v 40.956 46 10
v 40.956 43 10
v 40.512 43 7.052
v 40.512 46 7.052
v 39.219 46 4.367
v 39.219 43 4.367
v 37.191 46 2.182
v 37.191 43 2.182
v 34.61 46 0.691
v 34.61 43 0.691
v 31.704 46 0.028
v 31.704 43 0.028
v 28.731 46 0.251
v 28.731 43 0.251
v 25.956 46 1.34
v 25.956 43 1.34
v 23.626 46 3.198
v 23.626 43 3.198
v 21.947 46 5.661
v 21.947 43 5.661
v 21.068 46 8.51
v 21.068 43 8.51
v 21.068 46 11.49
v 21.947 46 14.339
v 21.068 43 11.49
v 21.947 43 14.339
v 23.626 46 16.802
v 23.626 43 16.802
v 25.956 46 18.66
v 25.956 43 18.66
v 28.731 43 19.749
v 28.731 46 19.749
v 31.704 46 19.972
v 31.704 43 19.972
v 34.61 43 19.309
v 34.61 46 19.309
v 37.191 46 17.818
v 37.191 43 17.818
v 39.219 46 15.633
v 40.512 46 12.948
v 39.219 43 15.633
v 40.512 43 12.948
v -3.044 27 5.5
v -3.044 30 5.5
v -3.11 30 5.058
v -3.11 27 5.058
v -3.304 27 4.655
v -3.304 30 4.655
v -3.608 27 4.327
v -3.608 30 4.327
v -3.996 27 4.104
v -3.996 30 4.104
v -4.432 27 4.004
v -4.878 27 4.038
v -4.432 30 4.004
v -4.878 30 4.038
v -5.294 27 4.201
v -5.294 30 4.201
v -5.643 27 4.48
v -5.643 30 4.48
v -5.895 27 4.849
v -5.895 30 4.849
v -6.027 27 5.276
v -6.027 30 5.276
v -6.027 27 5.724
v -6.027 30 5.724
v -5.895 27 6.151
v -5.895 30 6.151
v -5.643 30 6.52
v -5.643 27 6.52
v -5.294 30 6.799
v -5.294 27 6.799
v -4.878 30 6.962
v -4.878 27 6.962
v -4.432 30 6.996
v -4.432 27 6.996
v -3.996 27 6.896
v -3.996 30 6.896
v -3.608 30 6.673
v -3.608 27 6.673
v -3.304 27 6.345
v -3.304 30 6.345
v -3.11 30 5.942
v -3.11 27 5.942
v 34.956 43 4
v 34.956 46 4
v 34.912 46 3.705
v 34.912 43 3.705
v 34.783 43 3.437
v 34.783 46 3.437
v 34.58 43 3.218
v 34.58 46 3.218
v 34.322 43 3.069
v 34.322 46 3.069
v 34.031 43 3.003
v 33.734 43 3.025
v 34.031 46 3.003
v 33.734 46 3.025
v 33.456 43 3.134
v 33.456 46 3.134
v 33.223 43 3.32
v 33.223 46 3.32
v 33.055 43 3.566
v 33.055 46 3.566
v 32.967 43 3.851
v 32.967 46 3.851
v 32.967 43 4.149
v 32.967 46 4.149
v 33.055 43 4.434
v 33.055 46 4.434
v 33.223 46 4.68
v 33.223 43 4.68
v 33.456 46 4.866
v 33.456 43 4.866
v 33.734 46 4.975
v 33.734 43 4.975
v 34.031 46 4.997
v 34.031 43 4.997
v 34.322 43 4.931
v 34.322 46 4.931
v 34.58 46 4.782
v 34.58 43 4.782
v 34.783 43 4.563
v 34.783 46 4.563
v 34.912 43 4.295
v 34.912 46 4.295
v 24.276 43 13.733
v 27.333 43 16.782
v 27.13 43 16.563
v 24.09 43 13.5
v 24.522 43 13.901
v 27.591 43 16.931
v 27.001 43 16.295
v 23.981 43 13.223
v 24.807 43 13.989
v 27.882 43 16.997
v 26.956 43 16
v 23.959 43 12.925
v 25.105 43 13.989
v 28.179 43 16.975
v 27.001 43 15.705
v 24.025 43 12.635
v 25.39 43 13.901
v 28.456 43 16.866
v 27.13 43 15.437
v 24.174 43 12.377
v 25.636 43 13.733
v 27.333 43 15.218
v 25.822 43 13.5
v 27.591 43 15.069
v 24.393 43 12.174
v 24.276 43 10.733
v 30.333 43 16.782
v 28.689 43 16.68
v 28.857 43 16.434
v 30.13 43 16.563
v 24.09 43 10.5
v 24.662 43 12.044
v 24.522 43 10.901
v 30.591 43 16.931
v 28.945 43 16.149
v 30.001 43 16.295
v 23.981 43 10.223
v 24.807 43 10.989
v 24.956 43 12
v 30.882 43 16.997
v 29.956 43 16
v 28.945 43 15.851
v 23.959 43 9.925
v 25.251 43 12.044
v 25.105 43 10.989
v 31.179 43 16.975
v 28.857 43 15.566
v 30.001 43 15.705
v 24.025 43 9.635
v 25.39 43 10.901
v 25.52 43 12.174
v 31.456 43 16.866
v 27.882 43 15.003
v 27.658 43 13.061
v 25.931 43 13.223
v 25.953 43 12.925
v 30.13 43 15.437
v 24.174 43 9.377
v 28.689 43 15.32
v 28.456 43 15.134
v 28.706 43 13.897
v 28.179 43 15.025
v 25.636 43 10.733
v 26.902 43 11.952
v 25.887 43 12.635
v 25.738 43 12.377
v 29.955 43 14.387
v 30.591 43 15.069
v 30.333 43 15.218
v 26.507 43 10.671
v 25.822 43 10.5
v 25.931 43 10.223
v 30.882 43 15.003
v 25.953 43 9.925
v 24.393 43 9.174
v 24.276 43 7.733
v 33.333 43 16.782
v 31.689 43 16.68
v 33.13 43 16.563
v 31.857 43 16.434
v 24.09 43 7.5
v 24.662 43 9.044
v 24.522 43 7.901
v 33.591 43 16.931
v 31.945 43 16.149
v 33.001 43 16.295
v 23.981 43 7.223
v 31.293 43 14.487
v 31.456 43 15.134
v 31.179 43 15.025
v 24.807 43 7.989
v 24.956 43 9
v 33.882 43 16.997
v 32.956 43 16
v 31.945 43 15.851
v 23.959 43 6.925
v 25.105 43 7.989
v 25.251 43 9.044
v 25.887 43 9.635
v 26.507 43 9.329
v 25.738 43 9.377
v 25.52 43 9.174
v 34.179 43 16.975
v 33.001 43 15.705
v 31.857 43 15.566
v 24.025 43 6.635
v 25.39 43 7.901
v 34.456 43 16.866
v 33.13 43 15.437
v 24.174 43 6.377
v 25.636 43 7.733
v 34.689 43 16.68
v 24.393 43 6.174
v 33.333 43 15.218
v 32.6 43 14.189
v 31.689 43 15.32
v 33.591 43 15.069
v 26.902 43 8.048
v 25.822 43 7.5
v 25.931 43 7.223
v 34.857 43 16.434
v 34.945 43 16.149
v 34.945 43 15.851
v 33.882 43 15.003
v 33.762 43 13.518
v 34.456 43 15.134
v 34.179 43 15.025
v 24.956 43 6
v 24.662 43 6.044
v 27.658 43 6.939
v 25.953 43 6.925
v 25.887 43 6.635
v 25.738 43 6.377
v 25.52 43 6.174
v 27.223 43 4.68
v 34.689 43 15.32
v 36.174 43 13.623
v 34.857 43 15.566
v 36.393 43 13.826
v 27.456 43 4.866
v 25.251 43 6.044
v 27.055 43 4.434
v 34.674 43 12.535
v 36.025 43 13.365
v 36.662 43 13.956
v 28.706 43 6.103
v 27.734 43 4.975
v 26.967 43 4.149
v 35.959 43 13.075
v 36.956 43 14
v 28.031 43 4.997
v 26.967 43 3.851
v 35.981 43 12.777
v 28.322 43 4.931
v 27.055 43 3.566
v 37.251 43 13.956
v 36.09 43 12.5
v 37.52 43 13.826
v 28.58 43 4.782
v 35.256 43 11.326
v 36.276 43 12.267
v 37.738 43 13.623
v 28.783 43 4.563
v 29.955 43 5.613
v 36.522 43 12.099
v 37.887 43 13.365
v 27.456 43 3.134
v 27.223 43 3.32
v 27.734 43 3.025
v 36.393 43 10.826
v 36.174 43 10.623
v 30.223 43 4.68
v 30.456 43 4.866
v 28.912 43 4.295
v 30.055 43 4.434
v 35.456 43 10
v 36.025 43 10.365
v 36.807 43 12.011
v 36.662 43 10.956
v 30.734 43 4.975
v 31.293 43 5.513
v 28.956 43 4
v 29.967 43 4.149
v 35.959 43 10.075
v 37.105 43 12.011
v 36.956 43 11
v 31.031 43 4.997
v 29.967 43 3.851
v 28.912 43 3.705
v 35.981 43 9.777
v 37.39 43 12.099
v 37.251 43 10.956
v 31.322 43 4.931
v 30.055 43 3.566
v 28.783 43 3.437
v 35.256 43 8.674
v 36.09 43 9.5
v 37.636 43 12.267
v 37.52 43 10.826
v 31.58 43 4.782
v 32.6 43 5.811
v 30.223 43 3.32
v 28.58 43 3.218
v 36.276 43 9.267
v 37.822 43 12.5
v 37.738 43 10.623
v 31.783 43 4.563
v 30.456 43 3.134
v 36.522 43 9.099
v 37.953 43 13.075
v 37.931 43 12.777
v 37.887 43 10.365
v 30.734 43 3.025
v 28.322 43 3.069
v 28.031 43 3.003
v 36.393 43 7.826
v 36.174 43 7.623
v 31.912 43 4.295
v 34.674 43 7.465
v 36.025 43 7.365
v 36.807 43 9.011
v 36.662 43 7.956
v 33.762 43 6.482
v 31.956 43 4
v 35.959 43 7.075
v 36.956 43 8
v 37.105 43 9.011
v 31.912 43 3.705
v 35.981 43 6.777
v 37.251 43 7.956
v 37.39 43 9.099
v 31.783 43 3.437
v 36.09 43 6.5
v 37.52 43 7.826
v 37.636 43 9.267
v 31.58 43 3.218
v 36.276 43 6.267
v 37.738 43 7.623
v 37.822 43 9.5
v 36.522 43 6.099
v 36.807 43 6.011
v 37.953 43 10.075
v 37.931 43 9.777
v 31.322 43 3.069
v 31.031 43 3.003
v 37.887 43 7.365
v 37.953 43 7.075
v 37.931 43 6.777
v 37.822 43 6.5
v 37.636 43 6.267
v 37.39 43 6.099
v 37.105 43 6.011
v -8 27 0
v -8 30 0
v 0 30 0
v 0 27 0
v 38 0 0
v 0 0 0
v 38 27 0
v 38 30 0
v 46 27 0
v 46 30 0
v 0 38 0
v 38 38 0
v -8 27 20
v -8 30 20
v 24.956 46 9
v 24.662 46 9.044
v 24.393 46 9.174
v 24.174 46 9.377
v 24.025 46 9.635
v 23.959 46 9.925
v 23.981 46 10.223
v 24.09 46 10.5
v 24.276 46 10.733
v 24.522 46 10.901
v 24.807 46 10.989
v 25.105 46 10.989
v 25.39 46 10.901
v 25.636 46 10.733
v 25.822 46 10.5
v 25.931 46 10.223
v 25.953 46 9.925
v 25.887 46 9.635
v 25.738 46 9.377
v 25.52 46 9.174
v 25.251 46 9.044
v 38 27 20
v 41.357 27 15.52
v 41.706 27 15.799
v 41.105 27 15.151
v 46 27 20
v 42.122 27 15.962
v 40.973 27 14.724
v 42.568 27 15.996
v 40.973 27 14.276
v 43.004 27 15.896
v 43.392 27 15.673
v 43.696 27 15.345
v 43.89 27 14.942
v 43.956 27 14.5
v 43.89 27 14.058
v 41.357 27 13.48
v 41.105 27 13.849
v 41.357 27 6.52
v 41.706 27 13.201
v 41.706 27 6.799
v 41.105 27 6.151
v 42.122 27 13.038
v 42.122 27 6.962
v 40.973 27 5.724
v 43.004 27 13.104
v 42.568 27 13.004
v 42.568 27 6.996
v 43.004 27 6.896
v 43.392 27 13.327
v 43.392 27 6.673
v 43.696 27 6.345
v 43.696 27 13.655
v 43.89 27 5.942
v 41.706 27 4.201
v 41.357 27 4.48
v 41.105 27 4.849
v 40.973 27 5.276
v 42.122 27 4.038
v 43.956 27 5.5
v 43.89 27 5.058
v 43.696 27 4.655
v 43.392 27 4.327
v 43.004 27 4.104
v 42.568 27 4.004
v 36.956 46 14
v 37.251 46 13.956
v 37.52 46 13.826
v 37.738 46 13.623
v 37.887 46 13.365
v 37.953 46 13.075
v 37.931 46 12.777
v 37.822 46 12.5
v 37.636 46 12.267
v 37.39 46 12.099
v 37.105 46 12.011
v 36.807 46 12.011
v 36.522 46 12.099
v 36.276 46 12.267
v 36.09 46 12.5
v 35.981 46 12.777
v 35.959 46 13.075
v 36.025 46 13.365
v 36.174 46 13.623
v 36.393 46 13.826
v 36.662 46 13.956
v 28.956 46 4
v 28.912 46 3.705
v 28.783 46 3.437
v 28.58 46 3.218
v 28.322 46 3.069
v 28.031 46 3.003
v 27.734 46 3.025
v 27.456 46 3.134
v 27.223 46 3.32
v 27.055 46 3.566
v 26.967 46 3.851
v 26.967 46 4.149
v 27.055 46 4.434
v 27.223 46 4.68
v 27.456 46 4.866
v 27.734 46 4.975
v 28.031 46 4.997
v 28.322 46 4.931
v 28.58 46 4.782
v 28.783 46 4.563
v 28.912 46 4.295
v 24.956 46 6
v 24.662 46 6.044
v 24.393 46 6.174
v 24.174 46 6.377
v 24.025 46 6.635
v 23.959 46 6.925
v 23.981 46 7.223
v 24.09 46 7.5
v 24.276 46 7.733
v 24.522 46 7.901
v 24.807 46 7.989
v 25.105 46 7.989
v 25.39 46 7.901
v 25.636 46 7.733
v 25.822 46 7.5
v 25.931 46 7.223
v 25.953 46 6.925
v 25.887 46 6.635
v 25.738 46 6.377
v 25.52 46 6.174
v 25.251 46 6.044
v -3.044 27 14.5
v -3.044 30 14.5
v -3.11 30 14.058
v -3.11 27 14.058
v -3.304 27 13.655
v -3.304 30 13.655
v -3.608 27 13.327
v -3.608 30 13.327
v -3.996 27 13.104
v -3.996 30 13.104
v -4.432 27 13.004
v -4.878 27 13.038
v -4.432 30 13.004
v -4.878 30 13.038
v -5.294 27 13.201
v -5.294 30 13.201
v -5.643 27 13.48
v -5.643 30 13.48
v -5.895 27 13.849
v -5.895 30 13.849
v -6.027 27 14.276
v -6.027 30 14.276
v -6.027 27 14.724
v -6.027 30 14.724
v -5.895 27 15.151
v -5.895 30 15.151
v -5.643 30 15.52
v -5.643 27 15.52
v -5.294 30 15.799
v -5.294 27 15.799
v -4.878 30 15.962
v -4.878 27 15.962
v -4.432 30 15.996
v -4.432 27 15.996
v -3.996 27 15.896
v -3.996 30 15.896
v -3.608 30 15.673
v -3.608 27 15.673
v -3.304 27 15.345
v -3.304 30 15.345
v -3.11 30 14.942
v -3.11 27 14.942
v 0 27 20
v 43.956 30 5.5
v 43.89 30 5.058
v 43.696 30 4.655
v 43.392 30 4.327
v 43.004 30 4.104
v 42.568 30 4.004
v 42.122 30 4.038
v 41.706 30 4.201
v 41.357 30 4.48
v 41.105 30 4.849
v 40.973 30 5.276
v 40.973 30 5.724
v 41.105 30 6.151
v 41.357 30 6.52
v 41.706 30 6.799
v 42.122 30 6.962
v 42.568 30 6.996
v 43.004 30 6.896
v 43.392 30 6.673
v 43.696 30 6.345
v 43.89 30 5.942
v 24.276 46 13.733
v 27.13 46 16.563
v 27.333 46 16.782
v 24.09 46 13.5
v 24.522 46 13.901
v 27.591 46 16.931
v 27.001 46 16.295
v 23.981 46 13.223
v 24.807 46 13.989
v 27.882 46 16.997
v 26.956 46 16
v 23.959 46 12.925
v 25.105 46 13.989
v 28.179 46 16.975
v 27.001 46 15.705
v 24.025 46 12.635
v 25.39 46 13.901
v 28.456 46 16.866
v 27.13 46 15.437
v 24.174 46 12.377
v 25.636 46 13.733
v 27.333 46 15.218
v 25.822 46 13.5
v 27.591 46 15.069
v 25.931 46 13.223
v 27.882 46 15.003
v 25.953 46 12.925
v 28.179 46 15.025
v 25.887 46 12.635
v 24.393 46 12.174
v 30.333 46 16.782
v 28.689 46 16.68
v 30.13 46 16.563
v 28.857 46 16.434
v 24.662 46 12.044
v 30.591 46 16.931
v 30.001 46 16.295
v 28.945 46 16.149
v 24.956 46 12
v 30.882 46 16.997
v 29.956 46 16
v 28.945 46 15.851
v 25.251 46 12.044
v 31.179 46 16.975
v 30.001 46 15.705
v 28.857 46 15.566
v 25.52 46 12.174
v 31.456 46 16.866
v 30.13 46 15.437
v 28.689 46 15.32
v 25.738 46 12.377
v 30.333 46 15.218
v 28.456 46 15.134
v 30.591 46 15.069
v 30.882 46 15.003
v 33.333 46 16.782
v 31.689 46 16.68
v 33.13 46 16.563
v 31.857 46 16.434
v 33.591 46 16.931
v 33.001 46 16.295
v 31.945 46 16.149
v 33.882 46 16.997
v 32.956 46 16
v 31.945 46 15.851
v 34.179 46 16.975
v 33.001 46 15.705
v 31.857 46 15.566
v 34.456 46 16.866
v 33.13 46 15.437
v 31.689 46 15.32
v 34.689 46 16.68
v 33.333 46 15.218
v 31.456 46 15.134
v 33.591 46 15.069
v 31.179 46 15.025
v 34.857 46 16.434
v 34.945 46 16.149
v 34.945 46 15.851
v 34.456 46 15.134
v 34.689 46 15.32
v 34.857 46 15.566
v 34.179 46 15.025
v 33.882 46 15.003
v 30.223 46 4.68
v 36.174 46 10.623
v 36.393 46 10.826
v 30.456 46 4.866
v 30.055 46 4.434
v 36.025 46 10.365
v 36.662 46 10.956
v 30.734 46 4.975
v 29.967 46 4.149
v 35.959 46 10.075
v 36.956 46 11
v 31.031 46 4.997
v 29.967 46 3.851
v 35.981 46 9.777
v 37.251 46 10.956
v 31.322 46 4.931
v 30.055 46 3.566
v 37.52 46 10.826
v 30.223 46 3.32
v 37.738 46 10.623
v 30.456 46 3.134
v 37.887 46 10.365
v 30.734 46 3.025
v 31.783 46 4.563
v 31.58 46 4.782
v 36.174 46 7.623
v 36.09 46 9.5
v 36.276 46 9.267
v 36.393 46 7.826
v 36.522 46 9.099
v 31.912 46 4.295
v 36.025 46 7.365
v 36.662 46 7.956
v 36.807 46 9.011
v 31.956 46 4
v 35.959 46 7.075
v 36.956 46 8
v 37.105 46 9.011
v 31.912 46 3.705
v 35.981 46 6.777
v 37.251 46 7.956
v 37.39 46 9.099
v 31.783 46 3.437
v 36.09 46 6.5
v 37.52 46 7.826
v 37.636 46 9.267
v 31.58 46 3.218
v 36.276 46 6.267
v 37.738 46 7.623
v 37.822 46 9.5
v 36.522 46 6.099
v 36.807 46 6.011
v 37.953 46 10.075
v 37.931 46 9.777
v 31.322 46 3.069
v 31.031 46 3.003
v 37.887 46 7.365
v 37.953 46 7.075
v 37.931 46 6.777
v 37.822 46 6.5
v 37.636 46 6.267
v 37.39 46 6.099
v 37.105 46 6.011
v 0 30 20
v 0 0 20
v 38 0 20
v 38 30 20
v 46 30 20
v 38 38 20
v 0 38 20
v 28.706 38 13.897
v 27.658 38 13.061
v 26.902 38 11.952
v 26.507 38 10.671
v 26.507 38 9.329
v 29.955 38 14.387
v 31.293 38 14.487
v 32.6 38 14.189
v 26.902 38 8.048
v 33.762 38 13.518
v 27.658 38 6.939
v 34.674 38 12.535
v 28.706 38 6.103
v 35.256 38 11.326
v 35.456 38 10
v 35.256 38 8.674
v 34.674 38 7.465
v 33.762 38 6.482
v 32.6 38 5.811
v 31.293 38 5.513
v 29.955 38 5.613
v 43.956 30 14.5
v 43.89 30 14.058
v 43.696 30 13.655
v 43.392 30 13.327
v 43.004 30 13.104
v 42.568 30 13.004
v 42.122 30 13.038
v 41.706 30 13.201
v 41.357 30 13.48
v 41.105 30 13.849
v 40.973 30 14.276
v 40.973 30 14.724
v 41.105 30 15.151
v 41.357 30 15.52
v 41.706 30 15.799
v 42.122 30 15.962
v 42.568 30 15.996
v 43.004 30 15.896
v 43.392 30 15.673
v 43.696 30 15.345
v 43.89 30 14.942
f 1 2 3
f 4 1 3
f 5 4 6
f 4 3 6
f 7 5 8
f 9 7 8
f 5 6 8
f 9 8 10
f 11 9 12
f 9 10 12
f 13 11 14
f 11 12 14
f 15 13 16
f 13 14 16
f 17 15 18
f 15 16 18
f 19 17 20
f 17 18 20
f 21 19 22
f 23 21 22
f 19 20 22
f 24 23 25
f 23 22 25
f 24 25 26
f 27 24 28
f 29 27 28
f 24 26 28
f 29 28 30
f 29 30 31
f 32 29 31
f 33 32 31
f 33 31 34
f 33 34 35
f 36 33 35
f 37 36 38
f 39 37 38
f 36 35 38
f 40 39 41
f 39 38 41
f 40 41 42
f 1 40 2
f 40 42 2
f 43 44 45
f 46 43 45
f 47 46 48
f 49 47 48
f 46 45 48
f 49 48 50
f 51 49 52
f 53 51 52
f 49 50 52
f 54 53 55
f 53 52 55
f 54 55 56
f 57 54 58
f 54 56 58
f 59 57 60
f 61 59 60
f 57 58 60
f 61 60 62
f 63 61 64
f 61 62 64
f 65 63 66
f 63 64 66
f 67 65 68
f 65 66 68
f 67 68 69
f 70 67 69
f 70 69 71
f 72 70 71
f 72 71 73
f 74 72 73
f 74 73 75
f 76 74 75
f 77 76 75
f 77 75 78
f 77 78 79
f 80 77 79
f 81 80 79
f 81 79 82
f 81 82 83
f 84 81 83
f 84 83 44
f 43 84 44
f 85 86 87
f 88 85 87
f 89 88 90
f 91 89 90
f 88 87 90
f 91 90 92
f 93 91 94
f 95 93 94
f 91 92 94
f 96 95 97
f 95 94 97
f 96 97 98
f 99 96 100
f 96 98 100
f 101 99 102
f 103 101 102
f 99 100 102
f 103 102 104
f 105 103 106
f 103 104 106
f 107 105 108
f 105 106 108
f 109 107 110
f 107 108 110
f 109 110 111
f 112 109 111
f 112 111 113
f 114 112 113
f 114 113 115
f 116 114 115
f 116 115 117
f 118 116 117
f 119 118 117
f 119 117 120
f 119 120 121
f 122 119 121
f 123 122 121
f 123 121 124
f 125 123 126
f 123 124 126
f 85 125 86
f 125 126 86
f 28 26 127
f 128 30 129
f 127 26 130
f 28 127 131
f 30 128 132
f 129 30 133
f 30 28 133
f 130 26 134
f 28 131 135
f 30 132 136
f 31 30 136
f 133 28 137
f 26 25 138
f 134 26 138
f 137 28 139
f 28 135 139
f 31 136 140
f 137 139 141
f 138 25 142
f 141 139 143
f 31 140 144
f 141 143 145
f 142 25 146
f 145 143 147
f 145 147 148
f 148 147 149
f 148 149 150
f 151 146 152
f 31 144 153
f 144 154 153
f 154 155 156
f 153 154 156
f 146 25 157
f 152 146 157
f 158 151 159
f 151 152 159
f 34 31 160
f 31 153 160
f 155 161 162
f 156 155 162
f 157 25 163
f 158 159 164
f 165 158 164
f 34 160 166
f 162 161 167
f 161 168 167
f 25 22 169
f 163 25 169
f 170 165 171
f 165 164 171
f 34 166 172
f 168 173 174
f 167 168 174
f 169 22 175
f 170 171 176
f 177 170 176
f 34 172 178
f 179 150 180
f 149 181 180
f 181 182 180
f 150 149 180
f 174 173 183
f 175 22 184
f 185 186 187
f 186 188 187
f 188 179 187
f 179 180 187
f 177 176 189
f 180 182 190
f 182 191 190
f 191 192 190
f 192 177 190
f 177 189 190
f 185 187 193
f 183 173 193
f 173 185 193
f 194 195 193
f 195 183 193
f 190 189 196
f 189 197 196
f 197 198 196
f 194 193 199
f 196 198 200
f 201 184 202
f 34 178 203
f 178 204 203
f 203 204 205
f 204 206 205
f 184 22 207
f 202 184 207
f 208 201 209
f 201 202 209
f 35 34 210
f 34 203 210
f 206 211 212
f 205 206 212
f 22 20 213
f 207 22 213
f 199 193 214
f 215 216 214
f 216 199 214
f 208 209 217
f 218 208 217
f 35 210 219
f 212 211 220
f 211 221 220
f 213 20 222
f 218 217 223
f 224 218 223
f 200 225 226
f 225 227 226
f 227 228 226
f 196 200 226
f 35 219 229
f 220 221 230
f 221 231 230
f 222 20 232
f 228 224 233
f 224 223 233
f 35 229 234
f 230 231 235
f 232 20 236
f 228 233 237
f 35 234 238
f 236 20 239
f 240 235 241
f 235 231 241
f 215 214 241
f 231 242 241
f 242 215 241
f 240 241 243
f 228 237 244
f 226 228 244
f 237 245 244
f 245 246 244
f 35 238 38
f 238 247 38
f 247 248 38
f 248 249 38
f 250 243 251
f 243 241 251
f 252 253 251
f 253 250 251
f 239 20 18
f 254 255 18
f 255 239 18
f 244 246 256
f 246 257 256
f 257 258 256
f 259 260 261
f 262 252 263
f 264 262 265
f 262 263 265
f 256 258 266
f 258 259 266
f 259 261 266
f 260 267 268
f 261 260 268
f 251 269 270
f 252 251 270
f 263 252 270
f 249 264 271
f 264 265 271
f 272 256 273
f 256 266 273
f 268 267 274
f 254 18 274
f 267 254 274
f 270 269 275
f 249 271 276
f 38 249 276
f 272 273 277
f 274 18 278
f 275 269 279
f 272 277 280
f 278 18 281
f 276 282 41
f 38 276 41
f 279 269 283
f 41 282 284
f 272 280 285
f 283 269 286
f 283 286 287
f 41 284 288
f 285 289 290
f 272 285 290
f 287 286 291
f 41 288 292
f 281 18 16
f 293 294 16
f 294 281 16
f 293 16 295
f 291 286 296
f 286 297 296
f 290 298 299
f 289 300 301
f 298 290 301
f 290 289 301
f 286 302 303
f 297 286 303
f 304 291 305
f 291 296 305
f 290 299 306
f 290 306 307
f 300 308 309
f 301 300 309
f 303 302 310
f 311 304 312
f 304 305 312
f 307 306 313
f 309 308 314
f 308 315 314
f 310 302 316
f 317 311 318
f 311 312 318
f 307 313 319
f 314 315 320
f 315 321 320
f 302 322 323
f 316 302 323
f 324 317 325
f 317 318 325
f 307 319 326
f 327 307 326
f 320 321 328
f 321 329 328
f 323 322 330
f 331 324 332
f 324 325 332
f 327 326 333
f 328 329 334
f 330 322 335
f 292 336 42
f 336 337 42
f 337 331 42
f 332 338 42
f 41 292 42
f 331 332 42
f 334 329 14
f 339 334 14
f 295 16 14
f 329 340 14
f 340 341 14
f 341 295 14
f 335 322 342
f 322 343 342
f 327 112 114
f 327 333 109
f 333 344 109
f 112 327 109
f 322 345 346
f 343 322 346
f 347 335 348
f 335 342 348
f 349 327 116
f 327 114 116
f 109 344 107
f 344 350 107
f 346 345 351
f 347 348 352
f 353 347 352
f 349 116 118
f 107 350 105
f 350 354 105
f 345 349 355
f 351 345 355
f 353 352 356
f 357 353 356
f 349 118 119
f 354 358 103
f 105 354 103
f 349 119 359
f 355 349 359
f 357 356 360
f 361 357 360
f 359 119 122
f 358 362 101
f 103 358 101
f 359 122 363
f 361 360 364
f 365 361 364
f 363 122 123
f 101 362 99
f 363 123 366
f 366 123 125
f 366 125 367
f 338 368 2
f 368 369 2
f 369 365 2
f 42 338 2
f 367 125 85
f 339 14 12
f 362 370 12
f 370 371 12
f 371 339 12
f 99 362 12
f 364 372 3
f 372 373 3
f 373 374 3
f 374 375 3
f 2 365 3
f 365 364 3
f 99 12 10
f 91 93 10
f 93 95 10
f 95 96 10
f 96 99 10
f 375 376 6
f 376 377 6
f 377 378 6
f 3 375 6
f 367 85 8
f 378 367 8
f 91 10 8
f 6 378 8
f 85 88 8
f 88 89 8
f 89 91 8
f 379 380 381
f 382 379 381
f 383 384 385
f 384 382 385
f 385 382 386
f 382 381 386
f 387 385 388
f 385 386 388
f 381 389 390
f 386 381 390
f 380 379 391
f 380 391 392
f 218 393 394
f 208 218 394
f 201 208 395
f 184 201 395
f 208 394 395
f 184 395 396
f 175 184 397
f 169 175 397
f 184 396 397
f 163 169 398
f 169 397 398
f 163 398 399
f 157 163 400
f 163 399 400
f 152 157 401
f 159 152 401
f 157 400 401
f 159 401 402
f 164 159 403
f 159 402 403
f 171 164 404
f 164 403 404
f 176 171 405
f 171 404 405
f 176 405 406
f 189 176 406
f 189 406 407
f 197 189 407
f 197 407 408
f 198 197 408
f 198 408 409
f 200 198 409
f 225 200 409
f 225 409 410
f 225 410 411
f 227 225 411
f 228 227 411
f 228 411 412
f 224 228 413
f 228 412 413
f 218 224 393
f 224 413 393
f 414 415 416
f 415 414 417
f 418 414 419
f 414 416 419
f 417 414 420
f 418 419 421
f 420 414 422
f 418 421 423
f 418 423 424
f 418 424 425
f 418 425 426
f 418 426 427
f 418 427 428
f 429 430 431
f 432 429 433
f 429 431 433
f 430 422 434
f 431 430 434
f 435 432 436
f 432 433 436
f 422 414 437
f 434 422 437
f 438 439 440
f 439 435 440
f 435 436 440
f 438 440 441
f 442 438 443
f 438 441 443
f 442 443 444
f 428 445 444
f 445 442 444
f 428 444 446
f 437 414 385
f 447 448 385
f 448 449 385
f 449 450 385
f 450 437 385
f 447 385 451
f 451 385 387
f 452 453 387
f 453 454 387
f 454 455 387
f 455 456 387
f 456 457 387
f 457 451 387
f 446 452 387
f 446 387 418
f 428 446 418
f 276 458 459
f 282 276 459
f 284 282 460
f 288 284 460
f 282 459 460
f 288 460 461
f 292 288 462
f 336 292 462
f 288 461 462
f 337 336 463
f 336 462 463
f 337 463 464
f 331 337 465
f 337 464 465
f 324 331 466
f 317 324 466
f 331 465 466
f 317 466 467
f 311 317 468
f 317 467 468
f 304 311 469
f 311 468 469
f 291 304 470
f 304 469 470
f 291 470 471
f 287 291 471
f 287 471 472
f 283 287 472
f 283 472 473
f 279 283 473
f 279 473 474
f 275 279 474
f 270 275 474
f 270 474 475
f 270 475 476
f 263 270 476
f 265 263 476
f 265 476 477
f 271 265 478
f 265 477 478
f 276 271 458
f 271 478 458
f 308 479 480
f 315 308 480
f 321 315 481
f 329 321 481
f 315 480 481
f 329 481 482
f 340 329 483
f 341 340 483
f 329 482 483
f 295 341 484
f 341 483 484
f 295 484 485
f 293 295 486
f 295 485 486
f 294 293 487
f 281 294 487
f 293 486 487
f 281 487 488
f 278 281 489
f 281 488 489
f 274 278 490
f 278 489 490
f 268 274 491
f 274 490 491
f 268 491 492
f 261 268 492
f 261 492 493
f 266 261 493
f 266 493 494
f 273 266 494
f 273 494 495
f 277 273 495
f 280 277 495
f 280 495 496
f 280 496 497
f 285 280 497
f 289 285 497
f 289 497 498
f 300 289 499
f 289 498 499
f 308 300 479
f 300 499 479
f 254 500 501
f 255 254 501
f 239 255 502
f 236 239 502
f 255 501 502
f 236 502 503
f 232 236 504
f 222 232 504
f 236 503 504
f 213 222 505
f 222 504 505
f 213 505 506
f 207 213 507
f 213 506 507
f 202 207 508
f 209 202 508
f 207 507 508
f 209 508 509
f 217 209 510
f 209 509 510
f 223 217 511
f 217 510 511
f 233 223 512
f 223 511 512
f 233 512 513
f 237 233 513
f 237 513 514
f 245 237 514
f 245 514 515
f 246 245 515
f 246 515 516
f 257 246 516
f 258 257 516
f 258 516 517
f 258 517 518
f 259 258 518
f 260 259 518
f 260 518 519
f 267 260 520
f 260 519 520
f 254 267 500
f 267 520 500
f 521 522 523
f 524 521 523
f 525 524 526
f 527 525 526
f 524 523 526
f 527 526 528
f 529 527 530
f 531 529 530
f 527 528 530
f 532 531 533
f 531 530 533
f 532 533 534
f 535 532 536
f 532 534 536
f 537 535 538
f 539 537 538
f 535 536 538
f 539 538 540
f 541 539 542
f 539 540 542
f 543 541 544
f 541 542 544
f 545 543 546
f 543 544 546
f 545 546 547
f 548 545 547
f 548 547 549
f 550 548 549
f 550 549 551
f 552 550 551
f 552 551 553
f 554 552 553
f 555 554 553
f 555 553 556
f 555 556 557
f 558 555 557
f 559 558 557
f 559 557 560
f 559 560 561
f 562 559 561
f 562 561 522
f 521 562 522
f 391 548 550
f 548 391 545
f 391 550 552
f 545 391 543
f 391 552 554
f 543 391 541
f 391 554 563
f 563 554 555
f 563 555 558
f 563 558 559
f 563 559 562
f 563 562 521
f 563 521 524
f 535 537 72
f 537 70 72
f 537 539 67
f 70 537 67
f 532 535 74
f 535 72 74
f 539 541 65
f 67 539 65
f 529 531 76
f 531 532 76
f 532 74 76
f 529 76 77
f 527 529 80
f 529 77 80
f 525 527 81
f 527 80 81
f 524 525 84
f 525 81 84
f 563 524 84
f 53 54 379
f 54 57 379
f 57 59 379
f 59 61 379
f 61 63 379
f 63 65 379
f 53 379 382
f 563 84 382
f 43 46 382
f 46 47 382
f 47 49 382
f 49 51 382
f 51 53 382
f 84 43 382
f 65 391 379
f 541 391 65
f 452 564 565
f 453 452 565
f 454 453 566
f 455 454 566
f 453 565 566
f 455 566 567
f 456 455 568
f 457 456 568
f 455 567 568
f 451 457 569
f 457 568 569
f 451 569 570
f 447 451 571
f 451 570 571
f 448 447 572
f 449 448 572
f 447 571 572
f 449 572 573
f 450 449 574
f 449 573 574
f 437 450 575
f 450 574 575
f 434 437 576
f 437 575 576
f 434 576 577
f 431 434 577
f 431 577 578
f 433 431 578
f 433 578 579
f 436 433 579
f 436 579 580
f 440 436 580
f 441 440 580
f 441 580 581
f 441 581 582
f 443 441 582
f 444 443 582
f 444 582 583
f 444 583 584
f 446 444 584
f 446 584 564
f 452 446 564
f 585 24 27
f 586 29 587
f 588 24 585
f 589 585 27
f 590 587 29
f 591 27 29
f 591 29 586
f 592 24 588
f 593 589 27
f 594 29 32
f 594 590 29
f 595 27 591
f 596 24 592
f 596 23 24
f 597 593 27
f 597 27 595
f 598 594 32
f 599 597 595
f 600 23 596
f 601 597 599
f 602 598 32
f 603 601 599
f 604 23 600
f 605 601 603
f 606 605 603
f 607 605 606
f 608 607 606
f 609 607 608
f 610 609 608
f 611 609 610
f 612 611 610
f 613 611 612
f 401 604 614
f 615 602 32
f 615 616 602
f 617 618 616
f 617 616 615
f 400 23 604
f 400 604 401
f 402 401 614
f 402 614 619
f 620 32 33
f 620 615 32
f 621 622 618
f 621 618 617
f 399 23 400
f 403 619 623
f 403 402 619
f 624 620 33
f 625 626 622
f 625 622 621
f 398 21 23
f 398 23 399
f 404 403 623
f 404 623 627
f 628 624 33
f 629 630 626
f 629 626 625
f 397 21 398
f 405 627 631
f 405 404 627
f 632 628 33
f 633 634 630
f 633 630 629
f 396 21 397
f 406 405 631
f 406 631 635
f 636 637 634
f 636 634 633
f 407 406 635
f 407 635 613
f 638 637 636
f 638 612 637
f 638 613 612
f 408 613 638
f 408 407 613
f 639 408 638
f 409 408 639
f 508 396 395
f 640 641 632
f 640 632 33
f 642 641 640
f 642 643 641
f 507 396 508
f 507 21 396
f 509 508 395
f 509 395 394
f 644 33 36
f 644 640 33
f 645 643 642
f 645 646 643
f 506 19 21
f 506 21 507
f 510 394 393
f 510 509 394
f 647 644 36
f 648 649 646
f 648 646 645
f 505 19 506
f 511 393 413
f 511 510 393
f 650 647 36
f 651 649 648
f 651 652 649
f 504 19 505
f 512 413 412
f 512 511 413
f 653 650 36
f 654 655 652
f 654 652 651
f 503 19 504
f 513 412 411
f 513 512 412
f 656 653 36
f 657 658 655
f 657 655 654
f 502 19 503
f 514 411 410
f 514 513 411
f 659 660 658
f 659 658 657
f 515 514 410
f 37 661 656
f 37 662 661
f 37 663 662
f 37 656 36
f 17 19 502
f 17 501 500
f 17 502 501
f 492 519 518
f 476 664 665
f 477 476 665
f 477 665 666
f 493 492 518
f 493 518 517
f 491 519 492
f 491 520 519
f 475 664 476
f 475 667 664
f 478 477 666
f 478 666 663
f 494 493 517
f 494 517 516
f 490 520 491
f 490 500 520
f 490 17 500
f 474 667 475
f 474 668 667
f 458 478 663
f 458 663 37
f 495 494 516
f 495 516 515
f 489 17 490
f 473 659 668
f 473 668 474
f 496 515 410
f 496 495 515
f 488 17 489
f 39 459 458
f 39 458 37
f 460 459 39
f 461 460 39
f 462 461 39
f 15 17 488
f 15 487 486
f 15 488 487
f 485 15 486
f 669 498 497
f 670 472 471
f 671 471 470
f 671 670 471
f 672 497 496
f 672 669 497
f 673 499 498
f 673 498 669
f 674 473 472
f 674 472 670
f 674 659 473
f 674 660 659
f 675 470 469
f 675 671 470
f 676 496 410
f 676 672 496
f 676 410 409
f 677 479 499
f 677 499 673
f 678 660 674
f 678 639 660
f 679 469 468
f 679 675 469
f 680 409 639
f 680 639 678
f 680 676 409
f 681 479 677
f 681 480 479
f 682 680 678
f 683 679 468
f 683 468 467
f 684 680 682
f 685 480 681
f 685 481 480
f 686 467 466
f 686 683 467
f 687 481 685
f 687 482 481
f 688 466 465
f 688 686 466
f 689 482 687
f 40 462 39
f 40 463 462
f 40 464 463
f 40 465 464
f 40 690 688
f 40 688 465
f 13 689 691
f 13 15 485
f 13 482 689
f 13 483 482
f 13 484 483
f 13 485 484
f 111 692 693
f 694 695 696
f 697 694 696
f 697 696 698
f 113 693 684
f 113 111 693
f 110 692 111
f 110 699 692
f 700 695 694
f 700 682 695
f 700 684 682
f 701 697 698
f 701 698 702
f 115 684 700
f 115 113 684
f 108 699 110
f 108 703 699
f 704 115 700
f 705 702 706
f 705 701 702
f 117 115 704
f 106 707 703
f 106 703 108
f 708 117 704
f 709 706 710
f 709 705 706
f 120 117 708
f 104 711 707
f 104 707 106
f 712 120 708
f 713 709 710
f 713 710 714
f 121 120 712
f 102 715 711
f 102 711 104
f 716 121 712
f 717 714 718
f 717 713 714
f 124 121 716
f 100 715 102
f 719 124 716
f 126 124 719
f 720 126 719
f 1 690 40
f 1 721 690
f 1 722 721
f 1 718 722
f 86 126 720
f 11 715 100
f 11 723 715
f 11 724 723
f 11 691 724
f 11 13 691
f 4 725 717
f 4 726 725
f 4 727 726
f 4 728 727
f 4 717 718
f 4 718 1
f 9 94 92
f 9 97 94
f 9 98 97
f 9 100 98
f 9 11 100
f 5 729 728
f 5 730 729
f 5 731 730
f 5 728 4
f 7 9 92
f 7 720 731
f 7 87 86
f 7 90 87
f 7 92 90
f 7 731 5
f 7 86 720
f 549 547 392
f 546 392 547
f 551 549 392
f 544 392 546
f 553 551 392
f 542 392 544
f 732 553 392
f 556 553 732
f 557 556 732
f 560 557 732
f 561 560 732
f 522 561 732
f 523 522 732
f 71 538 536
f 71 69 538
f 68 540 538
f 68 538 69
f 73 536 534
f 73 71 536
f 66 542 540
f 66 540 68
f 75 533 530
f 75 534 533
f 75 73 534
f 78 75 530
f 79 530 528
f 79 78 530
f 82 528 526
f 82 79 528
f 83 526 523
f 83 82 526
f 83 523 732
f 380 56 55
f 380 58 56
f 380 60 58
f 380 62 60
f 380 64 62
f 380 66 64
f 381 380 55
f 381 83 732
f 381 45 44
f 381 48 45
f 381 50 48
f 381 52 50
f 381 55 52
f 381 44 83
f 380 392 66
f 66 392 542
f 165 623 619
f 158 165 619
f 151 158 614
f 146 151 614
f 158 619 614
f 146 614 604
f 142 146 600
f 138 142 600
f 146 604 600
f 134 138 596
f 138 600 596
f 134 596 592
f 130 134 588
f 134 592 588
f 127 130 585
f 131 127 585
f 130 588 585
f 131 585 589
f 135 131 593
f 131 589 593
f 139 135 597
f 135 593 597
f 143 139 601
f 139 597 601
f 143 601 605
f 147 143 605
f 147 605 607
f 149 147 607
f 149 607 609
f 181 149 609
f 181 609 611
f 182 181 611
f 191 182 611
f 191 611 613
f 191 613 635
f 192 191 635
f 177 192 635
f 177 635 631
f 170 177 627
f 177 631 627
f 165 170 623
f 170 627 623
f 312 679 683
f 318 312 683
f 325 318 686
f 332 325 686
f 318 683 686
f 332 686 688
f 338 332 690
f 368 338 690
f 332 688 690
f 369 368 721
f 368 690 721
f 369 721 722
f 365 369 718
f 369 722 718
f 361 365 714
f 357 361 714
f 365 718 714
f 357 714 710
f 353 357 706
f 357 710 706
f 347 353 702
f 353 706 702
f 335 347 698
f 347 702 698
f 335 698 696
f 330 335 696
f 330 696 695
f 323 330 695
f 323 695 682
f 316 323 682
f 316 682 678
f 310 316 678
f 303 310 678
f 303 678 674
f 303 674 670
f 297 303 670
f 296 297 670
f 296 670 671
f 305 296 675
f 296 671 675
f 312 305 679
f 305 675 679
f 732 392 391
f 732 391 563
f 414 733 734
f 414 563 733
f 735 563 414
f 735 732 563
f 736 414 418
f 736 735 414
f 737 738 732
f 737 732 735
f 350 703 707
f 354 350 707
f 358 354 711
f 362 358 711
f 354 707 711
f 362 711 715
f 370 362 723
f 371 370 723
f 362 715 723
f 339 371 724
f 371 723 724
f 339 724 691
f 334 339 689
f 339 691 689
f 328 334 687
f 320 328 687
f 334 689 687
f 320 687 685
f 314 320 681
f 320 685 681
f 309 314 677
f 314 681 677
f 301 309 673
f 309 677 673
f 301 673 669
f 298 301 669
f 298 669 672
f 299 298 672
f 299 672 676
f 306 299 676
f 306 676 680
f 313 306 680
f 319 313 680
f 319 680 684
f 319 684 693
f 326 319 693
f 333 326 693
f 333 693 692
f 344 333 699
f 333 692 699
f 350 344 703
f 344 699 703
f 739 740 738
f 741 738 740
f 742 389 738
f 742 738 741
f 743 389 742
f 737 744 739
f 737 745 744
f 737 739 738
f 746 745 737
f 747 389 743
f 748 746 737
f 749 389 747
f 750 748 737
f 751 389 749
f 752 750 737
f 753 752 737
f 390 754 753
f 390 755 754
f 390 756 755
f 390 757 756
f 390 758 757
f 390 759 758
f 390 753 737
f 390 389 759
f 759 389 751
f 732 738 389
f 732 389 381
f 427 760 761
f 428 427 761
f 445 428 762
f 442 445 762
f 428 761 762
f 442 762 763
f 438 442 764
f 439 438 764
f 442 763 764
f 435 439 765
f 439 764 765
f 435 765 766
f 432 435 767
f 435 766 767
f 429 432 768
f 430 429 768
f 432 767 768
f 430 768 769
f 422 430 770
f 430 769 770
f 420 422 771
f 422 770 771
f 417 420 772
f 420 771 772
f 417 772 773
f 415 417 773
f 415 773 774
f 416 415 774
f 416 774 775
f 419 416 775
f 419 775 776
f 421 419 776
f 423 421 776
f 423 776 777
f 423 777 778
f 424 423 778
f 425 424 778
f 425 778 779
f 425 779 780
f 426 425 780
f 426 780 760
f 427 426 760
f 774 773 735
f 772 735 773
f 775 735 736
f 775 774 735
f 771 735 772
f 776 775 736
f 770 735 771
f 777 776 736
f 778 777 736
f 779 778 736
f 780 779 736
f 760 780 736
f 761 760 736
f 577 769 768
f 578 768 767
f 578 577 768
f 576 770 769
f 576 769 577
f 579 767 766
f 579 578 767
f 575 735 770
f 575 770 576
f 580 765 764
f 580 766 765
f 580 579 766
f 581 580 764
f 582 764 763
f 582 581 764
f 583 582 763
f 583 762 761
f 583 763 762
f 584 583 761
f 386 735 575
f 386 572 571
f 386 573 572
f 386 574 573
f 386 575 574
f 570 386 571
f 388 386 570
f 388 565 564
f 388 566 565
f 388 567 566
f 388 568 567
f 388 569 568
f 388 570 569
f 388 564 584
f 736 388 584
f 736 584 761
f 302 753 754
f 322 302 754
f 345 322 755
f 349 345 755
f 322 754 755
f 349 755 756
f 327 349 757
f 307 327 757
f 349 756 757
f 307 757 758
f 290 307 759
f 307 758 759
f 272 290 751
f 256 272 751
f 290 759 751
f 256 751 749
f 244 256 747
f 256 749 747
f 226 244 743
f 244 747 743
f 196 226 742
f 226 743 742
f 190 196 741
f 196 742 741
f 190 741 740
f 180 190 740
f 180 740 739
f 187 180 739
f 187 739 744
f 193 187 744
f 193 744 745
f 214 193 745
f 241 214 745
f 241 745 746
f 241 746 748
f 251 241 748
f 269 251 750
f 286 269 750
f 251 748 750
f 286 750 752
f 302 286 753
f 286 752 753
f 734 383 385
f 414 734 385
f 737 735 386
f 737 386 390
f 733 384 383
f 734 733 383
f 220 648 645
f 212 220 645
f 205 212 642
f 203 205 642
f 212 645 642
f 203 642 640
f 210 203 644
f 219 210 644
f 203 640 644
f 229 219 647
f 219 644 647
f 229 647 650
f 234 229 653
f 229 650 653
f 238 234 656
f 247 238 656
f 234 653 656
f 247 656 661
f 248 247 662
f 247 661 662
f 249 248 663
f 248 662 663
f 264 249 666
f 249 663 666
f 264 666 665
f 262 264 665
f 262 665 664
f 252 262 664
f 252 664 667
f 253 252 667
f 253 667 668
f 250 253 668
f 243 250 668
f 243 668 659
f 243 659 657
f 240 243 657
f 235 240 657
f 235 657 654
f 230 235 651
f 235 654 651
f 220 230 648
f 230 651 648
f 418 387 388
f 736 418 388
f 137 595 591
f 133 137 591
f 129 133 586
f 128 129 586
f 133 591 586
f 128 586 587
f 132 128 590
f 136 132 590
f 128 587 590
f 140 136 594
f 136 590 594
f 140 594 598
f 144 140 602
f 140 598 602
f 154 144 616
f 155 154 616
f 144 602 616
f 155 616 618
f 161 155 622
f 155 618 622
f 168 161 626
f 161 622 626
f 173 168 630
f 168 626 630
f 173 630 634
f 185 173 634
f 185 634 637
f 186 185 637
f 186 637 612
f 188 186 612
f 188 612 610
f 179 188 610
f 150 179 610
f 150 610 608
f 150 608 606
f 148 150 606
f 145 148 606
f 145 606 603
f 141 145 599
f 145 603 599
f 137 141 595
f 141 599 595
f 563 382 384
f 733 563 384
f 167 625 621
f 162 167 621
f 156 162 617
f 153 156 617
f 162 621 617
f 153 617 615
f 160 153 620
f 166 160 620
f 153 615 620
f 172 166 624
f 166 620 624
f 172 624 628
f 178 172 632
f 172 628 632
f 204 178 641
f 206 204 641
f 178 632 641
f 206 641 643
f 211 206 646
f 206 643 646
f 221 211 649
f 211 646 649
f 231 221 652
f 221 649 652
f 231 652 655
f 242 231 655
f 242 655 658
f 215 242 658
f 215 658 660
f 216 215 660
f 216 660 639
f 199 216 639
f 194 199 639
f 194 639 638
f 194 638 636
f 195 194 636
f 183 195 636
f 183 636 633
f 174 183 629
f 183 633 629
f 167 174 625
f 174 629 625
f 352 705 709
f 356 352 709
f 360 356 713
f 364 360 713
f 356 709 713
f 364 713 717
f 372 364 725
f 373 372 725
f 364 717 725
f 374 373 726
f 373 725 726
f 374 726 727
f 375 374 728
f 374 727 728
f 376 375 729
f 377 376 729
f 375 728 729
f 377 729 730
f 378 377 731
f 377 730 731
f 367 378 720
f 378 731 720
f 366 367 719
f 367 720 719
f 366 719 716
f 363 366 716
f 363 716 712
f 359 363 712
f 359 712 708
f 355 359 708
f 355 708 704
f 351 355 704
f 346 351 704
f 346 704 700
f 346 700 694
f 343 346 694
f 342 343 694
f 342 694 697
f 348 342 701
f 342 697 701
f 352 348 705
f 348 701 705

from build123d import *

# Parameters (mm, degrees)
SKETCH1_W           = 38
SKETCH1_H           = 27
SKETCH1_H_2         = 3
SKETCH1_H_3         = 8
SKETCH1_W_2         = 8
BOSS_EXTRUDE1_DEPTH = 20
SKETCH2_R           = 4.5
BOSS_EXTRUDE2_DEPTH = 5
SKETCH3_R           = 10
BOSS_EXTRUDE3_DEPTH = 3
SKETCH4_R           = 1.5
CUT_EXTRUDE1_DEPTH  = 10
SKETCH5_R           = 1
CUT_EXTRUDE2_DEPTH  = 3
CIRPATTERN1_COUNT   = 4


with BuildPart() as part:
    # Sketch1 → Boss-Extrude1 (new body)
    with BuildSketch(Plane.XY):
        with Locations((19, 13.5)):
            Rectangle(SKETCH1_W, SKETCH1_H)
        with Locations((19, 28.5)):
            Rectangle(SKETCH1_W, SKETCH1_H_2)
        with Locations((19, 34)):
            Rectangle(SKETCH1_W, SKETCH1_H_3)
        with Locations((42, 28.5)):
            Rectangle(SKETCH1_W_2, SKETCH1_H_2)
        with Locations((-4, 28.5)):
            Rectangle(SKETCH1_W_2, SKETCH1_H_2)
    extrude(amount=BOSS_EXTRUDE1_DEPTH)

    # Sketch2 → Boss-Extrude2 (add)
    with BuildSketch(Plane(origin=(0, 38, 0), x_dir=(1, 0, 0), z_dir=(0, 1, 0))):
        with Locations((30.956279898, -10)):
            Circle(SKETCH2_R)
    extrude(amount=BOSS_EXTRUDE2_DEPTH)

    # Sketch3 → Boss-Extrude3 (add)
    with BuildSketch(Plane(origin=(0, 43, 0), x_dir=(1, 0, 0), z_dir=(0, 1, 0))):
        with Locations((30.956279898, -10)):
            Circle(SKETCH3_R)
    extrude(amount=BOSS_EXTRUDE3_DEPTH)

    # Sketch4 → Cut-Extrude1 (cut)
    with BuildSketch(Plane(origin=(0, 30, 0), x_dir=(1, 0, 0), z_dir=(0, 1, 0))):
        with Locations((42.456279898, -14.5)):
            Circle(SKETCH4_R)
        with Locations((42.456279898, -5.5)):
            Circle(SKETCH4_R)
        with Locations((-4.543720102, -14.5)):
            Circle(SKETCH4_R)
        with Locations((-4.543720102, -5.5)):
            Circle(SKETCH4_R)
    extrude(amount=-CUT_EXTRUDE1_DEPTH, mode=Mode.SUBTRACT)

    # Sketch5 → Cut-Extrude2 (cut)
    with BuildSketch(Plane(origin=(0, 46, 0), x_dir=(1, 0, 0), z_dir=(0, 1, 0))):
        with Locations((30.956279898, -4)):
            Circle(SKETCH5_R)
        with Locations((27.956279898, -4)):
            Circle(SKETCH5_R)
        with Locations((33.956279898, -4)):
            Circle(SKETCH5_R)
    cut_extrude2 = extrude(amount=-CUT_EXTRUDE2_DEPTH, mode=Mode.SUBTRACT)

    # CirPattern1: Cut-Extrude2 ×4 about axis
    cirpattern1_axis = Axis((30.956279898, 0, 10), (0, 1, 0))
    for i in range(1, CIRPATTERN1_COUNT):
        add(cut_extrude2.rotate(cirpattern1_axis, i * 360 / CIRPATTERN1_COUNT), mode=Mode.SUBTRACT)


solid = part.part
